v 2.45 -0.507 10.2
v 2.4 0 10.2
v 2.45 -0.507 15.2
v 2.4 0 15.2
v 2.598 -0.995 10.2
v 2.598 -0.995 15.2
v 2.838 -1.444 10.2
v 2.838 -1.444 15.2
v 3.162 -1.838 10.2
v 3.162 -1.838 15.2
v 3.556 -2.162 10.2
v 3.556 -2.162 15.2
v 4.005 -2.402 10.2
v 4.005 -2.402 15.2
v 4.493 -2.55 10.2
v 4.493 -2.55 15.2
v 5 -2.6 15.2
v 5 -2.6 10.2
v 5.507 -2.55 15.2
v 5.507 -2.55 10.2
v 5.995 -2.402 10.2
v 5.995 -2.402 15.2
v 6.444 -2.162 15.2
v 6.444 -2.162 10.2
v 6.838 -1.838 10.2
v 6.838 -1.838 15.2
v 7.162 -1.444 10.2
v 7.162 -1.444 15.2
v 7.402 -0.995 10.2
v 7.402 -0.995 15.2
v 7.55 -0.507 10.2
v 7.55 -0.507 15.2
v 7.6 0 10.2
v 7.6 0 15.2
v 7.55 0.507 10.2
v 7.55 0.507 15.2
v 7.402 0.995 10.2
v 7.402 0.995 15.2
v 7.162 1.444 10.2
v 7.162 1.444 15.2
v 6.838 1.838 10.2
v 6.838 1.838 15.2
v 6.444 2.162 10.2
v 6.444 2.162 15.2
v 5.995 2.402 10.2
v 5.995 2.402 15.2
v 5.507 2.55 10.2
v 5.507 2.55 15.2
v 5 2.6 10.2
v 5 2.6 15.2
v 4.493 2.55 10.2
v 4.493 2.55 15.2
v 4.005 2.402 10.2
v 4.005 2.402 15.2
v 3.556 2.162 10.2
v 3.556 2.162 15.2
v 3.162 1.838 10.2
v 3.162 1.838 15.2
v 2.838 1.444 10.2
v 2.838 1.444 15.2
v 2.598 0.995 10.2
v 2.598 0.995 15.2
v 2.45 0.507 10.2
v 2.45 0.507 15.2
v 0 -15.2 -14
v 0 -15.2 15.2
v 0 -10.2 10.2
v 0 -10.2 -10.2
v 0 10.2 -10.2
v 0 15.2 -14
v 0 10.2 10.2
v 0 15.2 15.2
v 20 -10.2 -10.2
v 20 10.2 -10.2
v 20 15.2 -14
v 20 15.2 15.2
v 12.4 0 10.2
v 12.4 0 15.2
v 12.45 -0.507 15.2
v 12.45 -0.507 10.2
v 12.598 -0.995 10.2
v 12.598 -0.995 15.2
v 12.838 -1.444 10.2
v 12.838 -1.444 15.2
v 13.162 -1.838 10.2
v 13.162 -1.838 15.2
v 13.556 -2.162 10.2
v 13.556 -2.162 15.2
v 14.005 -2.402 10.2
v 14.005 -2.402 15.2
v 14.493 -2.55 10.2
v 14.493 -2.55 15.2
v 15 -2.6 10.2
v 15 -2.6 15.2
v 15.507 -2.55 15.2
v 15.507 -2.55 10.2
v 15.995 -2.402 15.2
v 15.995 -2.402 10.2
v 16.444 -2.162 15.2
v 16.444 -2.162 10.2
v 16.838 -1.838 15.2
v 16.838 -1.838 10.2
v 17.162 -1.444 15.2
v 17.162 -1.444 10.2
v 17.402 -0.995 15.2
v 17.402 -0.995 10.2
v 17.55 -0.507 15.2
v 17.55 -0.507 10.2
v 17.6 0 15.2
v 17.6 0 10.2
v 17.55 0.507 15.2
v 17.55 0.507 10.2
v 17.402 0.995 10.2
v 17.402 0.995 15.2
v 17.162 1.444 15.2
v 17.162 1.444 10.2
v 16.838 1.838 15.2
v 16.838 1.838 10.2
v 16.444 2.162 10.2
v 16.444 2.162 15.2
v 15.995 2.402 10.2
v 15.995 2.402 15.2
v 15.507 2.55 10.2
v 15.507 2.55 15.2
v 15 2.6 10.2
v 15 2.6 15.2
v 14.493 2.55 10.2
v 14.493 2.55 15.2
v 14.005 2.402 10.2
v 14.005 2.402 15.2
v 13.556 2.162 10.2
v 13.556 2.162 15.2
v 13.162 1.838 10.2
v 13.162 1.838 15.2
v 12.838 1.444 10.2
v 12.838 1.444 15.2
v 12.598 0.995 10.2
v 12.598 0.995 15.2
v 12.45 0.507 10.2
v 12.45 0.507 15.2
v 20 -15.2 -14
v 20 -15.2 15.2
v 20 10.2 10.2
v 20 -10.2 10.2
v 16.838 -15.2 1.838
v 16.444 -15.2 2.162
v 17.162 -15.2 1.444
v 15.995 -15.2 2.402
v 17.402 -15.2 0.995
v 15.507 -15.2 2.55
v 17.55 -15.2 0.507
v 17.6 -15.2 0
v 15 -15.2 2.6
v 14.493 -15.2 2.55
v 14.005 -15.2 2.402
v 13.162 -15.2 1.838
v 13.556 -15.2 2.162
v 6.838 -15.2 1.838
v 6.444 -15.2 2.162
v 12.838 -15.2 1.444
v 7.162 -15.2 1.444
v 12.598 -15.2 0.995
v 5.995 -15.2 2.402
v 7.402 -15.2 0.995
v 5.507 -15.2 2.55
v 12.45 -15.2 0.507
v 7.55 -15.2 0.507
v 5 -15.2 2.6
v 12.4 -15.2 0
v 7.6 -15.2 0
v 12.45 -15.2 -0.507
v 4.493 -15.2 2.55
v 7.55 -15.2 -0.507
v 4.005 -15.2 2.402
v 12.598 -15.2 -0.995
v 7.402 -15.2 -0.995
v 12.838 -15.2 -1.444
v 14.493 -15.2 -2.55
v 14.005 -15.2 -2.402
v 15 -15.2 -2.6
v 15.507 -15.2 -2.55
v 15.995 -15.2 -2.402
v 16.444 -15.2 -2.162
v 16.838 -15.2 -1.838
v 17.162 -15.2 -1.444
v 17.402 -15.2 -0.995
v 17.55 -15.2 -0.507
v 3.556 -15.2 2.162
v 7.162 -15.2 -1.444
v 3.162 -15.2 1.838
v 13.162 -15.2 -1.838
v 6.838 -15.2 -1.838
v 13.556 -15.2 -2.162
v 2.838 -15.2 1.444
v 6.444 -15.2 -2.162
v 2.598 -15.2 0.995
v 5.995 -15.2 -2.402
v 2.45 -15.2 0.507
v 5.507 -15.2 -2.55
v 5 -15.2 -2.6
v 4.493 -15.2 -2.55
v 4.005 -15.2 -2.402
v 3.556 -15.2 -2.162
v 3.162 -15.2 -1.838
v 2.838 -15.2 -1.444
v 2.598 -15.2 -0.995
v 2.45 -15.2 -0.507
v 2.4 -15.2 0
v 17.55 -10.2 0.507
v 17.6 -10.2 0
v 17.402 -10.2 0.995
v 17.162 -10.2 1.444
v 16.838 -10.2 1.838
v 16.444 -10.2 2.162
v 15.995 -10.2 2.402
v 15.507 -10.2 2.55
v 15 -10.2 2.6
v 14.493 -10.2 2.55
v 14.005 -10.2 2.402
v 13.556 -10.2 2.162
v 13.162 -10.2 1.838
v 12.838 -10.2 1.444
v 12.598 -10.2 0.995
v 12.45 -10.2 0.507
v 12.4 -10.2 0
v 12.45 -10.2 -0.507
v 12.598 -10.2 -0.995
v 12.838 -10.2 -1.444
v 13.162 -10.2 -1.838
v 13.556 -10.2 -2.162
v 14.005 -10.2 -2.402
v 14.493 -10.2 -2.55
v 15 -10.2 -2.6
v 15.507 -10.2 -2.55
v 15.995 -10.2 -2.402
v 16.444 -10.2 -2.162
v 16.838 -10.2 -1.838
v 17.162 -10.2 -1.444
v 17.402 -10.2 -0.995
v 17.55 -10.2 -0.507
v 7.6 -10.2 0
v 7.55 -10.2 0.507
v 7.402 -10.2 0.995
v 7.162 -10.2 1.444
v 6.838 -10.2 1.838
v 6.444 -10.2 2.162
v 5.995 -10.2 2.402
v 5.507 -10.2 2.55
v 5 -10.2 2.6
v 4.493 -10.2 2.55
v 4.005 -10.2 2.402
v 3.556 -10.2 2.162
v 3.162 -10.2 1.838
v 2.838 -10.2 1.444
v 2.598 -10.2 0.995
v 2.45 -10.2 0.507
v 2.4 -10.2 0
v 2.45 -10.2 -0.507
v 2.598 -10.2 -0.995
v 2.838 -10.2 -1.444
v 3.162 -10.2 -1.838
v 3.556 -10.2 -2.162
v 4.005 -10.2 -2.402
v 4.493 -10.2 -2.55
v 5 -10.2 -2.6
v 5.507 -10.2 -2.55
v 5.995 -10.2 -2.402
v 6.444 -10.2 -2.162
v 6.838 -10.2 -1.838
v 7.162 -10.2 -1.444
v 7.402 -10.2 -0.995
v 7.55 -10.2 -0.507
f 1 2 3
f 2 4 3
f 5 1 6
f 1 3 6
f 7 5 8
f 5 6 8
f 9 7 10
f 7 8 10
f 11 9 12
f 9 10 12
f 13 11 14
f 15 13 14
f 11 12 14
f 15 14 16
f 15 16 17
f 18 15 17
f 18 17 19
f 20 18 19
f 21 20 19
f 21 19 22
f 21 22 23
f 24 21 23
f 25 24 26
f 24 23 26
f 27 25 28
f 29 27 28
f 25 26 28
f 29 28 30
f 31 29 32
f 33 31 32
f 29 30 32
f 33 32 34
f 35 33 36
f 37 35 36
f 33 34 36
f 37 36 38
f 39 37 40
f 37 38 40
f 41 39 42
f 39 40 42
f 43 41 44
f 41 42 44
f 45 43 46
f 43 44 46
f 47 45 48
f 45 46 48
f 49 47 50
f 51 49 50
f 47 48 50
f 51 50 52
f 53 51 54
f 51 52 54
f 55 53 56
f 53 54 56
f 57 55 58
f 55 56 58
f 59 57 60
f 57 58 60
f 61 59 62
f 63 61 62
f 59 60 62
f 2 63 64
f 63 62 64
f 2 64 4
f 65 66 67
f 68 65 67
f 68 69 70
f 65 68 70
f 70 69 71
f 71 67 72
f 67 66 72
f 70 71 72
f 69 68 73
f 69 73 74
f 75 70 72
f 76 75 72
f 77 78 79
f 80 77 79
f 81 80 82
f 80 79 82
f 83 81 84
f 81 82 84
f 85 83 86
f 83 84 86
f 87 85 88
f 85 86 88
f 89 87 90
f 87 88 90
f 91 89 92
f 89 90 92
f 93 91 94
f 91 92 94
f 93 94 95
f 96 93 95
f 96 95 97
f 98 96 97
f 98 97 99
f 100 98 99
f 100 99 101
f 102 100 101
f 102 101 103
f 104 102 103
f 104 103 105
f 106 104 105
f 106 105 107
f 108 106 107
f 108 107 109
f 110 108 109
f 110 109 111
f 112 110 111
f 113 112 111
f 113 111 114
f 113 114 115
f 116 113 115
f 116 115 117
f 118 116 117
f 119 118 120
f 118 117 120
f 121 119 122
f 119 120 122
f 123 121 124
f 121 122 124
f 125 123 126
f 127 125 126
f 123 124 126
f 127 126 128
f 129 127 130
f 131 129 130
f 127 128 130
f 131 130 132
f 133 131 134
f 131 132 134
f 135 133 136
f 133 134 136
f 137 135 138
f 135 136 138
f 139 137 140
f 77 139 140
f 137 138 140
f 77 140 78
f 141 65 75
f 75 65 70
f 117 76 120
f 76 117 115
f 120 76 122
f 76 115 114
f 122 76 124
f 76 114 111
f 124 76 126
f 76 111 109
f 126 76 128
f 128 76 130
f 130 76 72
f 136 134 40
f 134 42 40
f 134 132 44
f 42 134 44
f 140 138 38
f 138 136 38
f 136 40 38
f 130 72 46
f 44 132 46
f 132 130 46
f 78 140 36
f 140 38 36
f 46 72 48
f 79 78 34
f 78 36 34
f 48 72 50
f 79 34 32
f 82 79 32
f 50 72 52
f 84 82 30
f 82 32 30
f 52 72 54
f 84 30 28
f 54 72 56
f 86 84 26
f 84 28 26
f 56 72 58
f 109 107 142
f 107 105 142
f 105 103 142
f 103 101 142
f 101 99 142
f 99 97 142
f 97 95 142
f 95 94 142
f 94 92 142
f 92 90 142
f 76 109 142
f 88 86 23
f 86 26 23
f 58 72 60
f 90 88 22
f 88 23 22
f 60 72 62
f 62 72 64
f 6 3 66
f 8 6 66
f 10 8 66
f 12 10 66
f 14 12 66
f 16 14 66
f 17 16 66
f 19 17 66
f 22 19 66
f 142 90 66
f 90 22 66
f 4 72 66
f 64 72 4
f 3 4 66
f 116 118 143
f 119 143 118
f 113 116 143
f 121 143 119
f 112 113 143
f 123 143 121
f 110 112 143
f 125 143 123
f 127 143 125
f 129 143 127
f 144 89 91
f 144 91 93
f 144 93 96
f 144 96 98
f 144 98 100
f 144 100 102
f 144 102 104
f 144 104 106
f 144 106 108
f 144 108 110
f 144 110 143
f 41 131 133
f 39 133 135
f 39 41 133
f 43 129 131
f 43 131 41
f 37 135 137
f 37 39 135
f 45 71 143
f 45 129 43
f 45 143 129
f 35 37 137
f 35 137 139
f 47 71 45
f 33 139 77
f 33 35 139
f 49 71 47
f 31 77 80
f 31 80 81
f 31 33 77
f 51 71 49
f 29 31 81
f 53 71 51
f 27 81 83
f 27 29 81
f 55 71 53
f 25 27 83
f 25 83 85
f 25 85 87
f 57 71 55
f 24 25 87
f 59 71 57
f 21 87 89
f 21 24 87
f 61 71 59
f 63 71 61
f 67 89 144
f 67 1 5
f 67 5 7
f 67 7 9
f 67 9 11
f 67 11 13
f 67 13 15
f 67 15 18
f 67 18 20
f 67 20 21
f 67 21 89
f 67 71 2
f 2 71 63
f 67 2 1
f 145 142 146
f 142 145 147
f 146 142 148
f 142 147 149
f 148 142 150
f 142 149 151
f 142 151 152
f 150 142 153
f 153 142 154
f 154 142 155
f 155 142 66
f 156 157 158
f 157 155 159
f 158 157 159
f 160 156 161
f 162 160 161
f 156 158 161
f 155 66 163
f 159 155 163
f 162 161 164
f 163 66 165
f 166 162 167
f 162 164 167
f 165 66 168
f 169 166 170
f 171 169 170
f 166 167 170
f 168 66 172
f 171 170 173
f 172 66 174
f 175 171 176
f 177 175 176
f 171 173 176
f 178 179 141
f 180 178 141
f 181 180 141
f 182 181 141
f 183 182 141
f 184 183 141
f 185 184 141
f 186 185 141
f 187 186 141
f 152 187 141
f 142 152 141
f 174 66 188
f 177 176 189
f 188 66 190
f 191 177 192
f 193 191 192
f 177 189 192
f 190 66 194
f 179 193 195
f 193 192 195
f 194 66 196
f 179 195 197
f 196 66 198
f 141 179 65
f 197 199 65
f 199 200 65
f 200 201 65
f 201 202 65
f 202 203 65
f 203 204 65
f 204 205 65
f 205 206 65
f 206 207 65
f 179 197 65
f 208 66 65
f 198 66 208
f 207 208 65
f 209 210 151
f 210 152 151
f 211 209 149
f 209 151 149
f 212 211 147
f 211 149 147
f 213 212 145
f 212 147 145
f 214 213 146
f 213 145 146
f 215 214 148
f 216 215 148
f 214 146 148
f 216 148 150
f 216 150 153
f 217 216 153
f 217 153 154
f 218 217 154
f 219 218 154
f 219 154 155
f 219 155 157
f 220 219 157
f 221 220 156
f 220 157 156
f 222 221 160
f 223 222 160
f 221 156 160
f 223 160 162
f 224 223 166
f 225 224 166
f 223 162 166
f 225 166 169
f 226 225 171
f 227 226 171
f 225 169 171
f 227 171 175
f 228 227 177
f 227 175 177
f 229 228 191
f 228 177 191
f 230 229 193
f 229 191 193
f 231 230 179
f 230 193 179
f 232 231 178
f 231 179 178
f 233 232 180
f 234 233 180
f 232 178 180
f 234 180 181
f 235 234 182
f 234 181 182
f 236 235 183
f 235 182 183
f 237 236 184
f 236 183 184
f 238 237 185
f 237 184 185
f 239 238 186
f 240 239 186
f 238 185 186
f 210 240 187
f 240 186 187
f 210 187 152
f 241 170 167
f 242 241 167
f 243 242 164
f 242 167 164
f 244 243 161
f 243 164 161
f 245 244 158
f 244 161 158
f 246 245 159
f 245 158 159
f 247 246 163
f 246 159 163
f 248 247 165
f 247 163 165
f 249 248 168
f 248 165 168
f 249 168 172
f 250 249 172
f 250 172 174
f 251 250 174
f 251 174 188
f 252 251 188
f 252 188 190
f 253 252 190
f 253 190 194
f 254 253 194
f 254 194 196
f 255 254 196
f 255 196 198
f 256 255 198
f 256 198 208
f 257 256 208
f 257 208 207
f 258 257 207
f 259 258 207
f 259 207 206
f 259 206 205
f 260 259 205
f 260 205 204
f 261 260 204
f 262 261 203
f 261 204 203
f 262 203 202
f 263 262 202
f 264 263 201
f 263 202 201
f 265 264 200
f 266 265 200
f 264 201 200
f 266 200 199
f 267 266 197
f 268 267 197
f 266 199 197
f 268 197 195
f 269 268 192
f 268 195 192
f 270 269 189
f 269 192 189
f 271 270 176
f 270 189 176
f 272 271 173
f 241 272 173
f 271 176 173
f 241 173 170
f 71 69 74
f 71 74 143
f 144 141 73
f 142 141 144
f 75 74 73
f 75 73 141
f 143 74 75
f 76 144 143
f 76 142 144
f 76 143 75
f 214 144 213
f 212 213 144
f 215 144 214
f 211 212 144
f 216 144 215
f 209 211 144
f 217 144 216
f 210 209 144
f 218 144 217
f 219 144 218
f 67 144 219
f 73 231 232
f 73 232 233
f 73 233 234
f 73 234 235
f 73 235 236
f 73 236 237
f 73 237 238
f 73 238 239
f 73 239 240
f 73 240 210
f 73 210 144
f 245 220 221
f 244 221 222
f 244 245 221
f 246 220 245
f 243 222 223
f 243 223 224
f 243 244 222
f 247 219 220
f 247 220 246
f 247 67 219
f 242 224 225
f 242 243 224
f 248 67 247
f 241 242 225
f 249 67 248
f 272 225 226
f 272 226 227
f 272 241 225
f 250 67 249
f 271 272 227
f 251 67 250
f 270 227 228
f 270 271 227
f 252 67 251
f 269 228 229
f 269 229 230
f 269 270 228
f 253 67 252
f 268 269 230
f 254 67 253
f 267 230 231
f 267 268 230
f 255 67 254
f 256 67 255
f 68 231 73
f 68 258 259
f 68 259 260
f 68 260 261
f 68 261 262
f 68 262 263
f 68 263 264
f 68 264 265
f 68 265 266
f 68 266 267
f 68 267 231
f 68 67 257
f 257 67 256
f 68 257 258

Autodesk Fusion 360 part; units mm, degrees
sketch "스케치1" plane through (0, 0, 0) normal (1, 0, 0) x (0, 1, 0)
  line L0 (15.2, 15.2) -> (-15.2, 15.2)
  line L1 (-15.2, 15.2) -> (-15.2, -15.2)
  line L2 (-15.2, -15.2) -> (15.2, -15.2)
  line L3 (15.2, -15.2) -> (15.2, 15.2)
  line L4 (15.2, 15.2) -> (-15.2, -15.2) construction
  line L5 (-15.2, 15.2) -> (15.2, -15.2) construction
  line L6 (10.2, 10.2) -> (-10.2, 10.2)
  line L7 (-10.2, 10.2) -> (-10.2, -10.2)
  line L8 (-10.2, -10.2) -> (10.2, -10.2)
  line L9 (10.2, -10.2) -> (10.2, 10.2)
  line L10 (10.2, 10.2) -> (-10.2, -10.2) construction
  line L11 (-10.2, 10.2) -> (10.2, -10.2) construction
  dimension "d1" = 30.4
  dimension "d2" = 30.4
  dimension "d3" = 20.4
  dimension "d4" = 20.4
extrude "돌출1" add sketch "스케치1" along normal blind 20
extrude "돌출2" cut 1 faces at (13.3333, -5.0667, -15.2) along direction (0, 0, 1) blind 1.2
sketch "스케치2" plane through (0, 0, 15.2) normal (0, 0, 1) x (-1, 0, 0)
  line L0 (0, -15.2) -> (0, 15.2)
  line L1 (0, 15.2) -> (-20, 15.2)
  line L2 (-20, 15.2) -> (-20, -15.2)
  line L3 (-20, -15.2) -> (0, -15.2)
  line L4 (0, 0) -> (-5, 0)
  circle A0 centre (-5, 0) radius 2.6
  line L5 (-20, 0) -> (-15, 0)
  circle A1 centre (-15, 0) radius 2.6
  dimension "d9" = 5
  dimension "d10" = 5.2
  dimension "d11" = 5
  dimension "d12" = 5.2
extrude "돌출3" cut sketch "스케치2" against normal blind 10 contours A0 | A1
sketch "스케치3" plane through (0, -15.2, 0) normal (0, -1, 0) x (1, 0, 0)
  line L0 (0, -14) -> (20, -14)
  line L1 (20, -14) -> (20, 15.2)
  line L2 (20, 15.2) -> (0, 15.2)
  line L3 (0, 15.2) -> (0, -14)
  line L4 (0, 0) -> (5, 0)
  line L5 (20, 0) -> (15, 0)
  circle A0 centre (5, 0) radius 2.6
  circle A1 centre (15, 0) radius 2.6
  dimension "d15" = 5
  dimension "d16" = 5
  dimension "d17" = 5.2
  dimension "d18" = 5.2
extrude "돌출4" cut sketch "스케치3" against normal blind 5 contours A1 | A0
